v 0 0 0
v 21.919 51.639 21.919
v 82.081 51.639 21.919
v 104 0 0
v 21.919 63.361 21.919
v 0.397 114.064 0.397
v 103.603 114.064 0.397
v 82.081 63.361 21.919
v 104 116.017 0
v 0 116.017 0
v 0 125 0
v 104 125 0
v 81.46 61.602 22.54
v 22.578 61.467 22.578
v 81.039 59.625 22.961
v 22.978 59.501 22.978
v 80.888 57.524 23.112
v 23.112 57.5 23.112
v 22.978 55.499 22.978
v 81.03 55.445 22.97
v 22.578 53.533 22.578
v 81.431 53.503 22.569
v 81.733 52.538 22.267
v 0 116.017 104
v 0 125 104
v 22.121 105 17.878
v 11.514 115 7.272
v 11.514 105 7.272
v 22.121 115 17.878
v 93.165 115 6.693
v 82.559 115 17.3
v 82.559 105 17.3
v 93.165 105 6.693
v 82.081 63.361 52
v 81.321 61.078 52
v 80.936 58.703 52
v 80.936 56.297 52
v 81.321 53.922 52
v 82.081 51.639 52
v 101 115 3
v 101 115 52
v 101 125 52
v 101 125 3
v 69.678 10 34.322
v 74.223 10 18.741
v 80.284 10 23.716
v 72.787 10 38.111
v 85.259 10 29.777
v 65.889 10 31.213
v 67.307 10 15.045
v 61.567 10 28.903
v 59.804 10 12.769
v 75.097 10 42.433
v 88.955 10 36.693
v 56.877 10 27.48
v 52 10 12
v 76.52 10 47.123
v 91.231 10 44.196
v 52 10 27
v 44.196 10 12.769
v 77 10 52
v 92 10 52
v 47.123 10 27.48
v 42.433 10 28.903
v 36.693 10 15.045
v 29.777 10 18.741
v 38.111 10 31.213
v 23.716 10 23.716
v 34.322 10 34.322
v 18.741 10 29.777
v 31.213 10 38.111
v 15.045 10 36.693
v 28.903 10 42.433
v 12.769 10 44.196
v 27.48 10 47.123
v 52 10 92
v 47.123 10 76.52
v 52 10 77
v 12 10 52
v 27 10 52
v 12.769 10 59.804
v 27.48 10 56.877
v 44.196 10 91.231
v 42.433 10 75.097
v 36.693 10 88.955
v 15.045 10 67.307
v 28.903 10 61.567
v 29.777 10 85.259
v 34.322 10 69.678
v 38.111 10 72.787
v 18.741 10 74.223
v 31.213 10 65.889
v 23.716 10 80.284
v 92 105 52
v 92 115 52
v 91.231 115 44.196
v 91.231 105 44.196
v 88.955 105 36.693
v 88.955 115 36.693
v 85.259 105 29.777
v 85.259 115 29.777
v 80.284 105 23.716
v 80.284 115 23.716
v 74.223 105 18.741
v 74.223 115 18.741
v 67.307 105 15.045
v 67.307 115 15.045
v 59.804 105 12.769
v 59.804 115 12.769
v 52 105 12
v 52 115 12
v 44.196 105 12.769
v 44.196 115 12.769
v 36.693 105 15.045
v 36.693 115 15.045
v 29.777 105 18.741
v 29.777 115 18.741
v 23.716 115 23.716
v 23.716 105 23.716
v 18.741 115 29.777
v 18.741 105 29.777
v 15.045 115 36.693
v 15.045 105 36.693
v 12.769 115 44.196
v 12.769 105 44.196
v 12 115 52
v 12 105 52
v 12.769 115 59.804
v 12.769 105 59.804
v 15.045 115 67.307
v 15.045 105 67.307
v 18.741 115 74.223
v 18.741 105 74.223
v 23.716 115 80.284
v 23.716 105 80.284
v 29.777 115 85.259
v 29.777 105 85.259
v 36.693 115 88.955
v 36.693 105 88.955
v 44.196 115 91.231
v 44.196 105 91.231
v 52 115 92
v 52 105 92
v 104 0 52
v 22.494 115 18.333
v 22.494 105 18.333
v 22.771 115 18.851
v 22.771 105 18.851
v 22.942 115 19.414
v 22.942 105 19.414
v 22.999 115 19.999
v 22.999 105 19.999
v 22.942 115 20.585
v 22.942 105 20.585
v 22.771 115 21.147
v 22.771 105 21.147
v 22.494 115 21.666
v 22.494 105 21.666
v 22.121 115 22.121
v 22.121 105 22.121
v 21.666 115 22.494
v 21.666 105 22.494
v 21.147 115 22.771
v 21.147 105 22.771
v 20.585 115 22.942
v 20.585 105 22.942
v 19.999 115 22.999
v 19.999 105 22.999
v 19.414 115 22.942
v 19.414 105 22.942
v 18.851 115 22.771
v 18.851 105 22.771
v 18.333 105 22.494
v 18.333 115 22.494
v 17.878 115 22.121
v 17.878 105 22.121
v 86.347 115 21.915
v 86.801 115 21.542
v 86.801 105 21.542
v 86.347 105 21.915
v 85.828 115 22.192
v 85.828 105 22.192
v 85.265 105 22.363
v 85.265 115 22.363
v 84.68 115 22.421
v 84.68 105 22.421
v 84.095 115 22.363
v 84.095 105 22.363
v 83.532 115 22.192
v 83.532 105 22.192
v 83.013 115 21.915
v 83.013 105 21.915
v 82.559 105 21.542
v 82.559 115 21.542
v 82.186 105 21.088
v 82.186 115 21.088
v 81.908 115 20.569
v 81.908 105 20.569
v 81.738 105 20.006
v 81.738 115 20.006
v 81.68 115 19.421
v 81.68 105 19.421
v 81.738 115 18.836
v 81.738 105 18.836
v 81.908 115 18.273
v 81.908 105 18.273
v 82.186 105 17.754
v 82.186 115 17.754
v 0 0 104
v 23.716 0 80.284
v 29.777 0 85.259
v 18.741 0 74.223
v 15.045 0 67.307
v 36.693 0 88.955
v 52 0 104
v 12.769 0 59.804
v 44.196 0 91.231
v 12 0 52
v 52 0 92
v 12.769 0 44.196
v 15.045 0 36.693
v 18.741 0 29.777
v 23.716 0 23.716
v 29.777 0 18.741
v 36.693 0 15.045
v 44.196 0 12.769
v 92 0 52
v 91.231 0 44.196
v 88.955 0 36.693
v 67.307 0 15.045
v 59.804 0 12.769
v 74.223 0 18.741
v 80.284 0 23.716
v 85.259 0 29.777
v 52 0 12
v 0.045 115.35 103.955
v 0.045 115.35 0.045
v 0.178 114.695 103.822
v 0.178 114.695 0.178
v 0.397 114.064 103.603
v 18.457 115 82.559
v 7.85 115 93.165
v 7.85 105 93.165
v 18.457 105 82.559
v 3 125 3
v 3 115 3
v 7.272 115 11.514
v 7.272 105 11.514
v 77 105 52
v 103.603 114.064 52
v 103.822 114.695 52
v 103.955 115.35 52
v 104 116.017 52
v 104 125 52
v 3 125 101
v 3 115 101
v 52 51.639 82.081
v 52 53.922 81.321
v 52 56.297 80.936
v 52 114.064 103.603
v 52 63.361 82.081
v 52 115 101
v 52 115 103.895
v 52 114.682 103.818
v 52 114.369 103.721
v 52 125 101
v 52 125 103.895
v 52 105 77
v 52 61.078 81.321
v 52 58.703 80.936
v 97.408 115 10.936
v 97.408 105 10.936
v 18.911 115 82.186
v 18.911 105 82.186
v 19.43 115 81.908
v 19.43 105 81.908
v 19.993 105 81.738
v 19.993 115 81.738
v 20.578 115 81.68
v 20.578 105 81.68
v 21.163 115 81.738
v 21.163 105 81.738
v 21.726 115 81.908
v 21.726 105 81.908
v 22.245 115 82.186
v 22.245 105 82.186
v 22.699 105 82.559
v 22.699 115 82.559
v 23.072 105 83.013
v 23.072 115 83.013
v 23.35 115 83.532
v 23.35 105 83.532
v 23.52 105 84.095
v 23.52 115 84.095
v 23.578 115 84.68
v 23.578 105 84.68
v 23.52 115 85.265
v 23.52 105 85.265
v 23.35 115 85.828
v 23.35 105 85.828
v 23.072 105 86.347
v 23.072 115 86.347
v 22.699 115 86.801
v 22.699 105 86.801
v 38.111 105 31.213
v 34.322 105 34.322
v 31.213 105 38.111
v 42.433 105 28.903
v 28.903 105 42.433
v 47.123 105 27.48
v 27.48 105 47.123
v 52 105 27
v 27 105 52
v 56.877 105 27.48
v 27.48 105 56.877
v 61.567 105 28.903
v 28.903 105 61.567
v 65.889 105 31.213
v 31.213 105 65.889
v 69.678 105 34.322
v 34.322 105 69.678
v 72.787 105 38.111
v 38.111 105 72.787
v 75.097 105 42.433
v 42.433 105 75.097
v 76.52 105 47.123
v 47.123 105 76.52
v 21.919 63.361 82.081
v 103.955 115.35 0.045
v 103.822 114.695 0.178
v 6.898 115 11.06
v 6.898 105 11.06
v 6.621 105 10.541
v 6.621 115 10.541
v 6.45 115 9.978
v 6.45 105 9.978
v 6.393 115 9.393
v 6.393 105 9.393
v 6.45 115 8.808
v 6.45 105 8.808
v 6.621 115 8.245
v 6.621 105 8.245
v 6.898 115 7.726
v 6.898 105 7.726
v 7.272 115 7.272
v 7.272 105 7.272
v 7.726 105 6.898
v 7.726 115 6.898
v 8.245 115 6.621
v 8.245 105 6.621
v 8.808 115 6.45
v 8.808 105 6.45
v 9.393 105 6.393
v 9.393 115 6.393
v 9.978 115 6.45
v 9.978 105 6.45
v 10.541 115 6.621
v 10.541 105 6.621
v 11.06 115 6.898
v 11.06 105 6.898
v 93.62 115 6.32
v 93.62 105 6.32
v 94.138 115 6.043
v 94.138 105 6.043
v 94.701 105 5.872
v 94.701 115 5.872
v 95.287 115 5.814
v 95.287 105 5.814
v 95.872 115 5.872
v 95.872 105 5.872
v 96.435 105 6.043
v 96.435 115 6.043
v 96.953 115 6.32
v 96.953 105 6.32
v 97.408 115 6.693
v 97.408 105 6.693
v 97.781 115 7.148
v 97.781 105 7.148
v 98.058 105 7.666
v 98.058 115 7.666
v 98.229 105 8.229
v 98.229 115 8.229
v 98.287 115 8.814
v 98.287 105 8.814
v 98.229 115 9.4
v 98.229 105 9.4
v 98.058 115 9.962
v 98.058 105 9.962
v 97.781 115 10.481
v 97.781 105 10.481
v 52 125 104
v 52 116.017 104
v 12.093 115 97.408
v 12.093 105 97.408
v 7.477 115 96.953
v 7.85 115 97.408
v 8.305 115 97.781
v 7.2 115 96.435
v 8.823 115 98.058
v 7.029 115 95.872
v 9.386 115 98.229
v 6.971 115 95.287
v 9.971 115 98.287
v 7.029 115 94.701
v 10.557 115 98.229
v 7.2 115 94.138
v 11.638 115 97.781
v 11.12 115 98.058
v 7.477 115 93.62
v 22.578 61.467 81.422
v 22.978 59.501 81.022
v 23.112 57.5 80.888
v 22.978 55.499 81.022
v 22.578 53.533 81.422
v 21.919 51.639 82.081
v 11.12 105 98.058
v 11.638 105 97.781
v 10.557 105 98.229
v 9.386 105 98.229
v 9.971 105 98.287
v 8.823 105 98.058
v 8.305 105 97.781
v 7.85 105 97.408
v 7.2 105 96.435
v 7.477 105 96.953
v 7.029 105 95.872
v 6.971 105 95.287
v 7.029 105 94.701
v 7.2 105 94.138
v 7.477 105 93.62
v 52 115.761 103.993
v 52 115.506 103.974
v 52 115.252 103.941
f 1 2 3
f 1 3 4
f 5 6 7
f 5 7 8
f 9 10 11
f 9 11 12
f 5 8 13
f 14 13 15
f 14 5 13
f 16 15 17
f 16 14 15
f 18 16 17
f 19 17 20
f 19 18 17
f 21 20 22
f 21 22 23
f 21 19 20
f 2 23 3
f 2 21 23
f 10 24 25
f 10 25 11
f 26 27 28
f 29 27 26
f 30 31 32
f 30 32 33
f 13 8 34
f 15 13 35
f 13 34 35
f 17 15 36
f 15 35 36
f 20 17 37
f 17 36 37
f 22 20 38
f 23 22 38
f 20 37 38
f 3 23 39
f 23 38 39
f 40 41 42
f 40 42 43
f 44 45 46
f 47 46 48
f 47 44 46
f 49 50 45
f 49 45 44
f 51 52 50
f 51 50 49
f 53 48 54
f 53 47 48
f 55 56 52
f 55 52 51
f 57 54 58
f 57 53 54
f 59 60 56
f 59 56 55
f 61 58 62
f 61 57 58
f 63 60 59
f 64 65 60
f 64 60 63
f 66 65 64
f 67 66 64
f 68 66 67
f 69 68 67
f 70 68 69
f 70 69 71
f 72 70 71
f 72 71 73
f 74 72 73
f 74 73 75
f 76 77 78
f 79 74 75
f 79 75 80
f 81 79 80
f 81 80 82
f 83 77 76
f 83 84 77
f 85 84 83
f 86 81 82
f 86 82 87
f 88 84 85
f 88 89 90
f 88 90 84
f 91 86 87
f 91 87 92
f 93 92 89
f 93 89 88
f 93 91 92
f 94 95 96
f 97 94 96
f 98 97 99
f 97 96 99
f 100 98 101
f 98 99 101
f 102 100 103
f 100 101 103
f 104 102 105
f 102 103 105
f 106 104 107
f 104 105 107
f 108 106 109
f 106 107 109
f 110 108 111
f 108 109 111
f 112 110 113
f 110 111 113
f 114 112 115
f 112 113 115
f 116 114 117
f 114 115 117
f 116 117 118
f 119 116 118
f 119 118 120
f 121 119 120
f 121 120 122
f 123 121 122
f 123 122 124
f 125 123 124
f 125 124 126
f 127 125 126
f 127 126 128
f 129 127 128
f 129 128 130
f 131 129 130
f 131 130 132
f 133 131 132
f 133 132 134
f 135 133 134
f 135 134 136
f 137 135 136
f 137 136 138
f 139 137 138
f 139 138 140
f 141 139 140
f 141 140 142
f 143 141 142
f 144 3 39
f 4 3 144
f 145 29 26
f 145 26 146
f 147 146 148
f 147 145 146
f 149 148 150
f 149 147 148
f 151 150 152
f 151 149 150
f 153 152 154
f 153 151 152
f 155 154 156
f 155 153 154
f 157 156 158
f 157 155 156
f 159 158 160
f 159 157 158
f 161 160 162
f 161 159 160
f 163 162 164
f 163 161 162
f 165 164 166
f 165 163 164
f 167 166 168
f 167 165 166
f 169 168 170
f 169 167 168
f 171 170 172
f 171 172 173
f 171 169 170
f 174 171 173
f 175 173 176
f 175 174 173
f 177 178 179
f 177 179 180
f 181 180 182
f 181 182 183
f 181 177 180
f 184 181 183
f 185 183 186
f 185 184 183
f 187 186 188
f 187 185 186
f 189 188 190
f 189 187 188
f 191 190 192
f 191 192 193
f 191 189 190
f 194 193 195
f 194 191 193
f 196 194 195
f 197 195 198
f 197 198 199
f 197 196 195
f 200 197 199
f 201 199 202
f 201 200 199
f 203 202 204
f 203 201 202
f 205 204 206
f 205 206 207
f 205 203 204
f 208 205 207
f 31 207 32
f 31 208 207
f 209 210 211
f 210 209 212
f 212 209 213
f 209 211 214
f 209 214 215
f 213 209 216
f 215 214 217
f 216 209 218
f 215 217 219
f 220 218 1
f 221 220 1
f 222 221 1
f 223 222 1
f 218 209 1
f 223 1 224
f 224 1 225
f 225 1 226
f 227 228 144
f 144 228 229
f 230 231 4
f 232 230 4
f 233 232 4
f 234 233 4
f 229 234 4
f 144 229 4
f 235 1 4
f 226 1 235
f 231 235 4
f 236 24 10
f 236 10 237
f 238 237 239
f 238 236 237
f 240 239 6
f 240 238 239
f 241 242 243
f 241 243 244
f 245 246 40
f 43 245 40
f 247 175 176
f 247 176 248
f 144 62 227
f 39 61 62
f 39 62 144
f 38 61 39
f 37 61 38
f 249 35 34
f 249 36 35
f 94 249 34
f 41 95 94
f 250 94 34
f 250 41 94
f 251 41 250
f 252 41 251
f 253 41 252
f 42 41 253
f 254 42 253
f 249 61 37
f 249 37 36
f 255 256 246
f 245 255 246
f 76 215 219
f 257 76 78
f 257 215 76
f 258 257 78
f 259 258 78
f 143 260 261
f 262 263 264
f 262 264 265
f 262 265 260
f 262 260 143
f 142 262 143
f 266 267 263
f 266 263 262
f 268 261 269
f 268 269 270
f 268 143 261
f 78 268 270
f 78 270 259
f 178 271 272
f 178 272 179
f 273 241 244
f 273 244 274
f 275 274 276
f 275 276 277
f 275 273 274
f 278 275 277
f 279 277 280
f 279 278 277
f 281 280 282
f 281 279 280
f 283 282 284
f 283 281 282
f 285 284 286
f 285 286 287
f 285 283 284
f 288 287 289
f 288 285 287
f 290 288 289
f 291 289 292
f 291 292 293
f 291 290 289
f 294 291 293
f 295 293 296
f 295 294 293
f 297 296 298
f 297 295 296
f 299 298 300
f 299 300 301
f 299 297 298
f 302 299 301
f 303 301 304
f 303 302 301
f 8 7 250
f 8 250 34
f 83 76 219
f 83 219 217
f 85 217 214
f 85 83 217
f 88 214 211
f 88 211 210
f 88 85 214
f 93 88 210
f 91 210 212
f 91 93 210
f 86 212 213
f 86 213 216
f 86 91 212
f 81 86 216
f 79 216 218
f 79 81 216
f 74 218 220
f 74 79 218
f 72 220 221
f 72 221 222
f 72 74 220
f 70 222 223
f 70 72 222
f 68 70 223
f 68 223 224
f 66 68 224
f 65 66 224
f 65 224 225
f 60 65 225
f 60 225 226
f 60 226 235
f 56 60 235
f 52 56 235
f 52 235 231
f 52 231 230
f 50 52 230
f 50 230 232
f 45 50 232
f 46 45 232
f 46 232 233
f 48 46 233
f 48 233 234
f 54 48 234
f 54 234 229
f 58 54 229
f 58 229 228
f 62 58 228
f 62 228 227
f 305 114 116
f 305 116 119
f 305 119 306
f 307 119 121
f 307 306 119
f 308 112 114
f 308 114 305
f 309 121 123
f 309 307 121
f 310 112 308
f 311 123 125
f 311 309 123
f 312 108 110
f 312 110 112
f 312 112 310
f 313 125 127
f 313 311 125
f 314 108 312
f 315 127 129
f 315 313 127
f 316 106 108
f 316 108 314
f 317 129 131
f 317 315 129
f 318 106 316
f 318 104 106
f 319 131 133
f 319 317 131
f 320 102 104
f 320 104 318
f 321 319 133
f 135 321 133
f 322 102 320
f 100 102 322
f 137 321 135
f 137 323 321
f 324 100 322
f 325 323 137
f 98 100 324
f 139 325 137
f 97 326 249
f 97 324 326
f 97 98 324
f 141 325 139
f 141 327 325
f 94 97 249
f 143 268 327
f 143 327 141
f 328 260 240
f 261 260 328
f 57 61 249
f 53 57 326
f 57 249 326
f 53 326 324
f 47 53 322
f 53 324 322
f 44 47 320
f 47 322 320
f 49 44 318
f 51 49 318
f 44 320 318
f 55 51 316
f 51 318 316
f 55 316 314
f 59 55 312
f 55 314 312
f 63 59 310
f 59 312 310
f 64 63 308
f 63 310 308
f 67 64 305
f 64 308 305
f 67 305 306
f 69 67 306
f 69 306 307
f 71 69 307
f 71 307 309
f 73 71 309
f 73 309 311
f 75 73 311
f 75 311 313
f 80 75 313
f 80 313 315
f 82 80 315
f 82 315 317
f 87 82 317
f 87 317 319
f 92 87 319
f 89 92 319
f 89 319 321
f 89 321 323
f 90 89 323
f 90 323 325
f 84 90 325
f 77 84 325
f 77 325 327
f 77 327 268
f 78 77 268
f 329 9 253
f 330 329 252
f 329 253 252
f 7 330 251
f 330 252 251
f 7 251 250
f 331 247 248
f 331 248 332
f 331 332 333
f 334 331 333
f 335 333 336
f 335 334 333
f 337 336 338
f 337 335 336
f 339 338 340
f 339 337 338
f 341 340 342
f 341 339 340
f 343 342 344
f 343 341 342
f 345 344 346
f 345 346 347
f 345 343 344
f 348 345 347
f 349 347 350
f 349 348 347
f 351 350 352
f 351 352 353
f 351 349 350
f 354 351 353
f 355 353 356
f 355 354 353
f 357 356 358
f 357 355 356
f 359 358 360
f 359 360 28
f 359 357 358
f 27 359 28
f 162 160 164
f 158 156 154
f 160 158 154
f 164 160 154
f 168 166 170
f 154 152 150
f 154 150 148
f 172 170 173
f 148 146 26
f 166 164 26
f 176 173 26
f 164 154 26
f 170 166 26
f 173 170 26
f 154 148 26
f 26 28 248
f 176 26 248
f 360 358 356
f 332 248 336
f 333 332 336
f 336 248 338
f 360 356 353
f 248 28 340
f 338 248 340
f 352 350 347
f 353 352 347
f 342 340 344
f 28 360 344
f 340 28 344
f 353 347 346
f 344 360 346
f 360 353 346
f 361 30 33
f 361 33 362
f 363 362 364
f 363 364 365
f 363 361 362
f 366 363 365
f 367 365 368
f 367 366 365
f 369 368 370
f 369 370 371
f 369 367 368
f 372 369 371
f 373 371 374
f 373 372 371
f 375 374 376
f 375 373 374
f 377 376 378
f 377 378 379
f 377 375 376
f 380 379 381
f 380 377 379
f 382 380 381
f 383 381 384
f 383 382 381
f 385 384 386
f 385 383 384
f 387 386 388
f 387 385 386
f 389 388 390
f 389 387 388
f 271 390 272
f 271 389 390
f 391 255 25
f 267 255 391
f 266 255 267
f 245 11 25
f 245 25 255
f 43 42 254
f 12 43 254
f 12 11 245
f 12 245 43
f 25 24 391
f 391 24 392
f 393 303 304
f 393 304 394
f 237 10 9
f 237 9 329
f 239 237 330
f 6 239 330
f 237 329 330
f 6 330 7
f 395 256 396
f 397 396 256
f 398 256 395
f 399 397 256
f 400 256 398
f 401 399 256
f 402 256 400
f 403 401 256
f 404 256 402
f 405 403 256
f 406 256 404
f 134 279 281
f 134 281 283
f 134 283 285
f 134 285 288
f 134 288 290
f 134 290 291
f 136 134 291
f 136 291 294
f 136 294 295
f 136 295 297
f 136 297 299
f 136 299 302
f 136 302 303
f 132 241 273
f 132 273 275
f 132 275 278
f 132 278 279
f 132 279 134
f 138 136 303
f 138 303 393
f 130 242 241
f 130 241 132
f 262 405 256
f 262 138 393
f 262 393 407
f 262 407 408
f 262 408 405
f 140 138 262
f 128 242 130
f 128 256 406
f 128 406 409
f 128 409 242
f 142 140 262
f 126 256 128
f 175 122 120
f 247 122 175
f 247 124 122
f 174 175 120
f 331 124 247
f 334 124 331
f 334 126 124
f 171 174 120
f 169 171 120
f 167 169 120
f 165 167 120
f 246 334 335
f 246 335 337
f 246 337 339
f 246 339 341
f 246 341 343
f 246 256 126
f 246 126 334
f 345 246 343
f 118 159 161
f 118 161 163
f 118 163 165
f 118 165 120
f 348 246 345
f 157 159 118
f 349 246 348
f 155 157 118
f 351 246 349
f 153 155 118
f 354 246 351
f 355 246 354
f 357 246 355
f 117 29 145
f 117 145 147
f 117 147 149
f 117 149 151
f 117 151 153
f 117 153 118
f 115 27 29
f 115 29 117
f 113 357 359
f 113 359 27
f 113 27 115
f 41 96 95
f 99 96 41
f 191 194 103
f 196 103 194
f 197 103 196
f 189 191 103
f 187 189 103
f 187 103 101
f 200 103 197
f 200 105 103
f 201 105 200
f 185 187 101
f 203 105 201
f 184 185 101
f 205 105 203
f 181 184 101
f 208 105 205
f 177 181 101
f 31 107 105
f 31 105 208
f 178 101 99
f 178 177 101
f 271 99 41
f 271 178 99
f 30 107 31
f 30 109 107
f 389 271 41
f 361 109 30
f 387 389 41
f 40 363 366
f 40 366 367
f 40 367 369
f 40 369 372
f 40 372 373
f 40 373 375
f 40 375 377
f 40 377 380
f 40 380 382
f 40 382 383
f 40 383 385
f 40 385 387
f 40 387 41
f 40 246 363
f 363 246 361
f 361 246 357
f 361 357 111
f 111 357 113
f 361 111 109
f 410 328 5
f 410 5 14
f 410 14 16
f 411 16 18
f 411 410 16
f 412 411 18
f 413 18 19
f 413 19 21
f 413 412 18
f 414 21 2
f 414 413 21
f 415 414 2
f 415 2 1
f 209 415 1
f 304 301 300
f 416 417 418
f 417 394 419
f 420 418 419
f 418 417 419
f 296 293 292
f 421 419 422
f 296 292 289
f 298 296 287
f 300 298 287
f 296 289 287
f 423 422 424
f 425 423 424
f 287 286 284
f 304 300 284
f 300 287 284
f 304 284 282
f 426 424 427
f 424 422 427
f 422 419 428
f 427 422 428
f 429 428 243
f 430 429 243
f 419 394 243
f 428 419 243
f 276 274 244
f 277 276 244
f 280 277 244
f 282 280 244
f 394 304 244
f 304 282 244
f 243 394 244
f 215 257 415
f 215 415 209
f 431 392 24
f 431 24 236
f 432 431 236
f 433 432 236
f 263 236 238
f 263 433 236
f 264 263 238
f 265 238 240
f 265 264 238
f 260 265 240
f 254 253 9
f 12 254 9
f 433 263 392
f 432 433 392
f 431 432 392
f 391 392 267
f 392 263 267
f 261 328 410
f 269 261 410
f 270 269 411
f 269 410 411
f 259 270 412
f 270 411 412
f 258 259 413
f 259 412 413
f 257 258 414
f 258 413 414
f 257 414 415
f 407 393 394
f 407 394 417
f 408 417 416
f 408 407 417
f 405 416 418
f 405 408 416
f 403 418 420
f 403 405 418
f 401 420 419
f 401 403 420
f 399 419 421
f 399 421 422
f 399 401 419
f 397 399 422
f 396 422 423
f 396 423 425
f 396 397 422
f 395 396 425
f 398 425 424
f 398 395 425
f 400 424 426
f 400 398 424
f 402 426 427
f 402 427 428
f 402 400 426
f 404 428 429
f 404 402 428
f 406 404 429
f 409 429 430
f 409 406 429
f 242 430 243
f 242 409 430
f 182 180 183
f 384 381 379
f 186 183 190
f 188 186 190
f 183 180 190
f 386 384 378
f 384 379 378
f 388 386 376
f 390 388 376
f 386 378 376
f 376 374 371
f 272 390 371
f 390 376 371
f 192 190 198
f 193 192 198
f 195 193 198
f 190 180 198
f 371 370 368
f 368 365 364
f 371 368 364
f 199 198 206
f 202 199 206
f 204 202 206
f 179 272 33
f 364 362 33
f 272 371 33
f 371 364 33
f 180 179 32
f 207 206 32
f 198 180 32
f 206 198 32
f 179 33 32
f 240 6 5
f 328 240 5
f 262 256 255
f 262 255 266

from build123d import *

# Parameters (mm, degrees)
SKETCH1_W           = 104
SKETCH1_H           = 115
BOSS_EXTRUDE1_DEPTH = 104
CUT_EXTRUDE1_DEPTH  = 187.70029459
CUT_EXTRUDE2_DEPTH  = 187.70029459
SKETCH4_R           = 25
CUT_EXTRUDE3_DEPTH  = 187.70029459
SKETCH5_R           = 40
CUT_EXTRUDE4_DEPTH  = 10
CUT_EXTRUDE5_START  = -10
SKETCH6_R           = 40
CUT_EXTRUDE5_DEPTH  = 10
FILLET1_R           = 15
SKETCH8_W           = 104
SKETCH8_H           = 104
SKETCH8_W_2         = 98
SKETCH8_H_2         = 98
BOSS_EXTRUDE2_DEPTH = 10
FILLET2_R           = 5
CUT_EXTRUDE6_DEPTH  = 10
SKETCH12_W          = 52
SKETCH12_H          = 52
CUT_EXTRUDE8_DEPTH  = 187.70029459
CUT_EXTRUDE9_DEPTH  = 194.020724276
SKETCH15_W          = 52.000105155
SKETCH15_H          = 10
CUT_EXTRUDE12_DEPTH = 194.020497647


with BuildPart() as part:
    # Sketch1 → Boss-Extrude1 (new body)
    with BuildSketch(Plane.XY):
        with Locations((52, 57.5)):
            Rectangle(SKETCH1_W, SKETCH1_H)
    extrude(amount=BOSS_EXTRUDE1_DEPTH)

    # Sketch2 → Cut-Extrude1 (cut, through all)
    with BuildSketch(Plane(origin=(104, 0, 0), x_dir=(0, 0, -1), z_dir=(1, 0, 0))):
        Polygon((-104, 115), (-79.592698068, 57.5), (-104, 0), align=None)
        Polygon((0, 115), (-24.407301932, 57.5), (0, 0), align=None)
    extrude(amount=-CUT_EXTRUDE1_DEPTH, mode=Mode.SUBTRACT)

    # Sketch3 → Cut-Extrude2 (cut, through all)
    with BuildSketch(Plane.XY):
        Polygon((0, 115), (24.407301932, 57.5), (0, 0), align=None)
        Polygon((104, 115), (79.592698068, 57.5), (104, 0), align=None)
    extrude(amount=CUT_EXTRUDE2_DEPTH, mode=Mode.SUBTRACT)

    # Sketch4 → Cut-Extrude3 (cut, through all)
    with BuildSketch(Plane(origin=(0, 115, 0), x_dir=(1, 0, 0), z_dir=(0, 1, 0))):
        with Locations(Location((52, -52, 0), (0, 0, 270))):
            Circle(SKETCH4_R)
    extrude(amount=-CUT_EXTRUDE3_DEPTH, mode=Mode.SUBTRACT)

    # Sketch5 → Cut-Extrude4 (cut)
    with BuildSketch(Plane(origin=(0, 115, 0), x_dir=(1, 0, 0), z_dir=(0, 1, 0))):
        with Locations(Location((52, -52, 0), (0, 0, 270))):
            Circle(SKETCH5_R)
    extrude(amount=-CUT_EXTRUDE4_DEPTH, mode=Mode.SUBTRACT)

    # Sketch6 → Cut-Extrude5 (cut)
    with BuildSketch(Plane.XZ.offset(CUT_EXTRUDE5_START)):
        with Locations(Location((52, 52, 0), (0, 0, 90))):
            Circle(SKETCH6_R)
    extrude(amount=CUT_EXTRUDE5_DEPTH, mode=Mode.SUBTRACT)

    # Fillet1
    fillet1_edges = [part.edges().sort_by_distance(p)[0] for p in [
        (52, 57.5, 79.592698068),
        (52, 57.5, 24.407301932),
        (24.407301932, 57.5, 52),
        (79.592698068, 57.5, 52),
    ]]
    fillet(fillet1_edges, radius=FILLET1_R)

    # Sketch8 → Boss-Extrude2 (add)
    with BuildSketch(Plane(origin=(0, 115, 0), x_dir=(1, 0, 0), z_dir=(0, 1, 0))):
        with Locations((52, -52)):
            Rectangle(SKETCH8_W, SKETCH8_H)
        with Locations((52, -52)):
            Rectangle(SKETCH8_W_2, SKETCH8_H_2, mode=Mode.SUBTRACT)
    extrude(amount=BOSS_EXTRUDE2_DEPTH)

    # Fillet2
    fillet2_edges = [part.edges().sort_by_distance(p)[0] for p in [
        (52, 115, 104),
        (52, 115, 0),
        (0, 115, 52),
        (104, 115, 52),
    ]]
    fillet(fillet2_edges, radius=FILLET2_R)

    # Sketch11 → Cut-Extrude6 (cut)
    with BuildSketch(Plane(origin=(0, 115, 0), x_dir=(1, 0, 0), z_dir=(0, 1, 0))):
        with BuildLine():
            Line((97.40784106, -10.935563022), (86.801239342, -21.54216474))
            ThreePointArc((86.801239342, -21.54216474), (82.558598655, -21.54216474), (82.558598655, -17.299524053))
            Line((82.558598655, -17.299524053), (93.165200373, -6.692922335))
            ThreePointArc((93.165200373, -6.692922335), (97.40784106, -6.692922335), (97.40784106, -10.935563022))
        make_face()
        with BuildLine():
            Line((11.514167897, -7.27152721), (22.120769615, -17.878128928))
            ThreePointArc((22.120769615, -17.878128928), (22.120769615, -22.120769615), (17.878128928, -22.120769615))
            Line((17.878128928, -22.120769615), (7.27152721, -11.514167897))
            ThreePointArc((7.27152721, -11.514167897), (7.27152721, -7.27152721), (11.514167897, -7.27152721))
        make_face()
        with BuildLine():
            Line((93.743805248, -96.829236185), (83.13720353, -86.222634468))
            ThreePointArc((83.13720353, -86.222634468), (83.13720353, -81.97999378), (87.379844217, -81.97999378))
            Line((87.379844217, -81.97999378), (97.986445935, -92.586595498))
            ThreePointArc((97.986445935, -92.586595498), (97.986445935, -96.829236185), (93.743805248, -96.829236185))
        make_face()
        with BuildLine():
            Line((7.850132085, -93.165200373), (18.456733803, -82.558598655))
            ThreePointArc((18.456733803, -82.558598655), (22.69937449, -82.558598655), (22.69937449, -86.801239342))
            Line((22.69937449, -86.801239342), (12.092772772, -97.40784106))
            ThreePointArc((12.092772772, -97.40784106), (7.850132085, -97.40784106), (7.850132085, -93.165200373))
        make_face()
    extrude(amount=-CUT_EXTRUDE6_DEPTH, mode=Mode.SUBTRACT)

    # Sketch12 → Cut-Extrude8 (cut, through all)
    with BuildSketch(Plane(origin=(0, 115, 0), x_dir=(1, 0, 0), z_dir=(0, 1, 0))):
        with Locations((78, -78)):
            Rectangle(SKETCH12_W, SKETCH12_H)
    extrude(amount=-CUT_EXTRUDE8_DEPTH, mode=Mode.SUBTRACT)

    # Sketch13 → Cut-Extrude9 (cut, through all)
    with BuildSketch(Plane(origin=(0, 125, 0), x_dir=(1, 0, 0), z_dir=(0, 1, 0))):
        Polygon((101, -52), (104, -52), (104, -104), (52, -103.895424297), (52, -101), (101, -101), align=None)
    extrude(amount=-CUT_EXTRUDE9_DEPTH, mode=Mode.SUBTRACT)

    # Sketch15 → Cut-Extrude12 (cut, through all)
    with BuildSketch(Plane(origin=(-0.208729944, 0, 103.790428823), x_dir=(-0.9999979778024204, 0, -0.002011067147068195), z_dir=(0.002011067147068195, 0, -0.9999979778024204))):
        with Locations((-78.208888098, 120)):
            Rectangle(SKETCH15_W, SKETCH15_H)
    extrude(amount=-CUT_EXTRUDE12_DEPTH, mode=Mode.SUBTRACT)


solid = part.part
